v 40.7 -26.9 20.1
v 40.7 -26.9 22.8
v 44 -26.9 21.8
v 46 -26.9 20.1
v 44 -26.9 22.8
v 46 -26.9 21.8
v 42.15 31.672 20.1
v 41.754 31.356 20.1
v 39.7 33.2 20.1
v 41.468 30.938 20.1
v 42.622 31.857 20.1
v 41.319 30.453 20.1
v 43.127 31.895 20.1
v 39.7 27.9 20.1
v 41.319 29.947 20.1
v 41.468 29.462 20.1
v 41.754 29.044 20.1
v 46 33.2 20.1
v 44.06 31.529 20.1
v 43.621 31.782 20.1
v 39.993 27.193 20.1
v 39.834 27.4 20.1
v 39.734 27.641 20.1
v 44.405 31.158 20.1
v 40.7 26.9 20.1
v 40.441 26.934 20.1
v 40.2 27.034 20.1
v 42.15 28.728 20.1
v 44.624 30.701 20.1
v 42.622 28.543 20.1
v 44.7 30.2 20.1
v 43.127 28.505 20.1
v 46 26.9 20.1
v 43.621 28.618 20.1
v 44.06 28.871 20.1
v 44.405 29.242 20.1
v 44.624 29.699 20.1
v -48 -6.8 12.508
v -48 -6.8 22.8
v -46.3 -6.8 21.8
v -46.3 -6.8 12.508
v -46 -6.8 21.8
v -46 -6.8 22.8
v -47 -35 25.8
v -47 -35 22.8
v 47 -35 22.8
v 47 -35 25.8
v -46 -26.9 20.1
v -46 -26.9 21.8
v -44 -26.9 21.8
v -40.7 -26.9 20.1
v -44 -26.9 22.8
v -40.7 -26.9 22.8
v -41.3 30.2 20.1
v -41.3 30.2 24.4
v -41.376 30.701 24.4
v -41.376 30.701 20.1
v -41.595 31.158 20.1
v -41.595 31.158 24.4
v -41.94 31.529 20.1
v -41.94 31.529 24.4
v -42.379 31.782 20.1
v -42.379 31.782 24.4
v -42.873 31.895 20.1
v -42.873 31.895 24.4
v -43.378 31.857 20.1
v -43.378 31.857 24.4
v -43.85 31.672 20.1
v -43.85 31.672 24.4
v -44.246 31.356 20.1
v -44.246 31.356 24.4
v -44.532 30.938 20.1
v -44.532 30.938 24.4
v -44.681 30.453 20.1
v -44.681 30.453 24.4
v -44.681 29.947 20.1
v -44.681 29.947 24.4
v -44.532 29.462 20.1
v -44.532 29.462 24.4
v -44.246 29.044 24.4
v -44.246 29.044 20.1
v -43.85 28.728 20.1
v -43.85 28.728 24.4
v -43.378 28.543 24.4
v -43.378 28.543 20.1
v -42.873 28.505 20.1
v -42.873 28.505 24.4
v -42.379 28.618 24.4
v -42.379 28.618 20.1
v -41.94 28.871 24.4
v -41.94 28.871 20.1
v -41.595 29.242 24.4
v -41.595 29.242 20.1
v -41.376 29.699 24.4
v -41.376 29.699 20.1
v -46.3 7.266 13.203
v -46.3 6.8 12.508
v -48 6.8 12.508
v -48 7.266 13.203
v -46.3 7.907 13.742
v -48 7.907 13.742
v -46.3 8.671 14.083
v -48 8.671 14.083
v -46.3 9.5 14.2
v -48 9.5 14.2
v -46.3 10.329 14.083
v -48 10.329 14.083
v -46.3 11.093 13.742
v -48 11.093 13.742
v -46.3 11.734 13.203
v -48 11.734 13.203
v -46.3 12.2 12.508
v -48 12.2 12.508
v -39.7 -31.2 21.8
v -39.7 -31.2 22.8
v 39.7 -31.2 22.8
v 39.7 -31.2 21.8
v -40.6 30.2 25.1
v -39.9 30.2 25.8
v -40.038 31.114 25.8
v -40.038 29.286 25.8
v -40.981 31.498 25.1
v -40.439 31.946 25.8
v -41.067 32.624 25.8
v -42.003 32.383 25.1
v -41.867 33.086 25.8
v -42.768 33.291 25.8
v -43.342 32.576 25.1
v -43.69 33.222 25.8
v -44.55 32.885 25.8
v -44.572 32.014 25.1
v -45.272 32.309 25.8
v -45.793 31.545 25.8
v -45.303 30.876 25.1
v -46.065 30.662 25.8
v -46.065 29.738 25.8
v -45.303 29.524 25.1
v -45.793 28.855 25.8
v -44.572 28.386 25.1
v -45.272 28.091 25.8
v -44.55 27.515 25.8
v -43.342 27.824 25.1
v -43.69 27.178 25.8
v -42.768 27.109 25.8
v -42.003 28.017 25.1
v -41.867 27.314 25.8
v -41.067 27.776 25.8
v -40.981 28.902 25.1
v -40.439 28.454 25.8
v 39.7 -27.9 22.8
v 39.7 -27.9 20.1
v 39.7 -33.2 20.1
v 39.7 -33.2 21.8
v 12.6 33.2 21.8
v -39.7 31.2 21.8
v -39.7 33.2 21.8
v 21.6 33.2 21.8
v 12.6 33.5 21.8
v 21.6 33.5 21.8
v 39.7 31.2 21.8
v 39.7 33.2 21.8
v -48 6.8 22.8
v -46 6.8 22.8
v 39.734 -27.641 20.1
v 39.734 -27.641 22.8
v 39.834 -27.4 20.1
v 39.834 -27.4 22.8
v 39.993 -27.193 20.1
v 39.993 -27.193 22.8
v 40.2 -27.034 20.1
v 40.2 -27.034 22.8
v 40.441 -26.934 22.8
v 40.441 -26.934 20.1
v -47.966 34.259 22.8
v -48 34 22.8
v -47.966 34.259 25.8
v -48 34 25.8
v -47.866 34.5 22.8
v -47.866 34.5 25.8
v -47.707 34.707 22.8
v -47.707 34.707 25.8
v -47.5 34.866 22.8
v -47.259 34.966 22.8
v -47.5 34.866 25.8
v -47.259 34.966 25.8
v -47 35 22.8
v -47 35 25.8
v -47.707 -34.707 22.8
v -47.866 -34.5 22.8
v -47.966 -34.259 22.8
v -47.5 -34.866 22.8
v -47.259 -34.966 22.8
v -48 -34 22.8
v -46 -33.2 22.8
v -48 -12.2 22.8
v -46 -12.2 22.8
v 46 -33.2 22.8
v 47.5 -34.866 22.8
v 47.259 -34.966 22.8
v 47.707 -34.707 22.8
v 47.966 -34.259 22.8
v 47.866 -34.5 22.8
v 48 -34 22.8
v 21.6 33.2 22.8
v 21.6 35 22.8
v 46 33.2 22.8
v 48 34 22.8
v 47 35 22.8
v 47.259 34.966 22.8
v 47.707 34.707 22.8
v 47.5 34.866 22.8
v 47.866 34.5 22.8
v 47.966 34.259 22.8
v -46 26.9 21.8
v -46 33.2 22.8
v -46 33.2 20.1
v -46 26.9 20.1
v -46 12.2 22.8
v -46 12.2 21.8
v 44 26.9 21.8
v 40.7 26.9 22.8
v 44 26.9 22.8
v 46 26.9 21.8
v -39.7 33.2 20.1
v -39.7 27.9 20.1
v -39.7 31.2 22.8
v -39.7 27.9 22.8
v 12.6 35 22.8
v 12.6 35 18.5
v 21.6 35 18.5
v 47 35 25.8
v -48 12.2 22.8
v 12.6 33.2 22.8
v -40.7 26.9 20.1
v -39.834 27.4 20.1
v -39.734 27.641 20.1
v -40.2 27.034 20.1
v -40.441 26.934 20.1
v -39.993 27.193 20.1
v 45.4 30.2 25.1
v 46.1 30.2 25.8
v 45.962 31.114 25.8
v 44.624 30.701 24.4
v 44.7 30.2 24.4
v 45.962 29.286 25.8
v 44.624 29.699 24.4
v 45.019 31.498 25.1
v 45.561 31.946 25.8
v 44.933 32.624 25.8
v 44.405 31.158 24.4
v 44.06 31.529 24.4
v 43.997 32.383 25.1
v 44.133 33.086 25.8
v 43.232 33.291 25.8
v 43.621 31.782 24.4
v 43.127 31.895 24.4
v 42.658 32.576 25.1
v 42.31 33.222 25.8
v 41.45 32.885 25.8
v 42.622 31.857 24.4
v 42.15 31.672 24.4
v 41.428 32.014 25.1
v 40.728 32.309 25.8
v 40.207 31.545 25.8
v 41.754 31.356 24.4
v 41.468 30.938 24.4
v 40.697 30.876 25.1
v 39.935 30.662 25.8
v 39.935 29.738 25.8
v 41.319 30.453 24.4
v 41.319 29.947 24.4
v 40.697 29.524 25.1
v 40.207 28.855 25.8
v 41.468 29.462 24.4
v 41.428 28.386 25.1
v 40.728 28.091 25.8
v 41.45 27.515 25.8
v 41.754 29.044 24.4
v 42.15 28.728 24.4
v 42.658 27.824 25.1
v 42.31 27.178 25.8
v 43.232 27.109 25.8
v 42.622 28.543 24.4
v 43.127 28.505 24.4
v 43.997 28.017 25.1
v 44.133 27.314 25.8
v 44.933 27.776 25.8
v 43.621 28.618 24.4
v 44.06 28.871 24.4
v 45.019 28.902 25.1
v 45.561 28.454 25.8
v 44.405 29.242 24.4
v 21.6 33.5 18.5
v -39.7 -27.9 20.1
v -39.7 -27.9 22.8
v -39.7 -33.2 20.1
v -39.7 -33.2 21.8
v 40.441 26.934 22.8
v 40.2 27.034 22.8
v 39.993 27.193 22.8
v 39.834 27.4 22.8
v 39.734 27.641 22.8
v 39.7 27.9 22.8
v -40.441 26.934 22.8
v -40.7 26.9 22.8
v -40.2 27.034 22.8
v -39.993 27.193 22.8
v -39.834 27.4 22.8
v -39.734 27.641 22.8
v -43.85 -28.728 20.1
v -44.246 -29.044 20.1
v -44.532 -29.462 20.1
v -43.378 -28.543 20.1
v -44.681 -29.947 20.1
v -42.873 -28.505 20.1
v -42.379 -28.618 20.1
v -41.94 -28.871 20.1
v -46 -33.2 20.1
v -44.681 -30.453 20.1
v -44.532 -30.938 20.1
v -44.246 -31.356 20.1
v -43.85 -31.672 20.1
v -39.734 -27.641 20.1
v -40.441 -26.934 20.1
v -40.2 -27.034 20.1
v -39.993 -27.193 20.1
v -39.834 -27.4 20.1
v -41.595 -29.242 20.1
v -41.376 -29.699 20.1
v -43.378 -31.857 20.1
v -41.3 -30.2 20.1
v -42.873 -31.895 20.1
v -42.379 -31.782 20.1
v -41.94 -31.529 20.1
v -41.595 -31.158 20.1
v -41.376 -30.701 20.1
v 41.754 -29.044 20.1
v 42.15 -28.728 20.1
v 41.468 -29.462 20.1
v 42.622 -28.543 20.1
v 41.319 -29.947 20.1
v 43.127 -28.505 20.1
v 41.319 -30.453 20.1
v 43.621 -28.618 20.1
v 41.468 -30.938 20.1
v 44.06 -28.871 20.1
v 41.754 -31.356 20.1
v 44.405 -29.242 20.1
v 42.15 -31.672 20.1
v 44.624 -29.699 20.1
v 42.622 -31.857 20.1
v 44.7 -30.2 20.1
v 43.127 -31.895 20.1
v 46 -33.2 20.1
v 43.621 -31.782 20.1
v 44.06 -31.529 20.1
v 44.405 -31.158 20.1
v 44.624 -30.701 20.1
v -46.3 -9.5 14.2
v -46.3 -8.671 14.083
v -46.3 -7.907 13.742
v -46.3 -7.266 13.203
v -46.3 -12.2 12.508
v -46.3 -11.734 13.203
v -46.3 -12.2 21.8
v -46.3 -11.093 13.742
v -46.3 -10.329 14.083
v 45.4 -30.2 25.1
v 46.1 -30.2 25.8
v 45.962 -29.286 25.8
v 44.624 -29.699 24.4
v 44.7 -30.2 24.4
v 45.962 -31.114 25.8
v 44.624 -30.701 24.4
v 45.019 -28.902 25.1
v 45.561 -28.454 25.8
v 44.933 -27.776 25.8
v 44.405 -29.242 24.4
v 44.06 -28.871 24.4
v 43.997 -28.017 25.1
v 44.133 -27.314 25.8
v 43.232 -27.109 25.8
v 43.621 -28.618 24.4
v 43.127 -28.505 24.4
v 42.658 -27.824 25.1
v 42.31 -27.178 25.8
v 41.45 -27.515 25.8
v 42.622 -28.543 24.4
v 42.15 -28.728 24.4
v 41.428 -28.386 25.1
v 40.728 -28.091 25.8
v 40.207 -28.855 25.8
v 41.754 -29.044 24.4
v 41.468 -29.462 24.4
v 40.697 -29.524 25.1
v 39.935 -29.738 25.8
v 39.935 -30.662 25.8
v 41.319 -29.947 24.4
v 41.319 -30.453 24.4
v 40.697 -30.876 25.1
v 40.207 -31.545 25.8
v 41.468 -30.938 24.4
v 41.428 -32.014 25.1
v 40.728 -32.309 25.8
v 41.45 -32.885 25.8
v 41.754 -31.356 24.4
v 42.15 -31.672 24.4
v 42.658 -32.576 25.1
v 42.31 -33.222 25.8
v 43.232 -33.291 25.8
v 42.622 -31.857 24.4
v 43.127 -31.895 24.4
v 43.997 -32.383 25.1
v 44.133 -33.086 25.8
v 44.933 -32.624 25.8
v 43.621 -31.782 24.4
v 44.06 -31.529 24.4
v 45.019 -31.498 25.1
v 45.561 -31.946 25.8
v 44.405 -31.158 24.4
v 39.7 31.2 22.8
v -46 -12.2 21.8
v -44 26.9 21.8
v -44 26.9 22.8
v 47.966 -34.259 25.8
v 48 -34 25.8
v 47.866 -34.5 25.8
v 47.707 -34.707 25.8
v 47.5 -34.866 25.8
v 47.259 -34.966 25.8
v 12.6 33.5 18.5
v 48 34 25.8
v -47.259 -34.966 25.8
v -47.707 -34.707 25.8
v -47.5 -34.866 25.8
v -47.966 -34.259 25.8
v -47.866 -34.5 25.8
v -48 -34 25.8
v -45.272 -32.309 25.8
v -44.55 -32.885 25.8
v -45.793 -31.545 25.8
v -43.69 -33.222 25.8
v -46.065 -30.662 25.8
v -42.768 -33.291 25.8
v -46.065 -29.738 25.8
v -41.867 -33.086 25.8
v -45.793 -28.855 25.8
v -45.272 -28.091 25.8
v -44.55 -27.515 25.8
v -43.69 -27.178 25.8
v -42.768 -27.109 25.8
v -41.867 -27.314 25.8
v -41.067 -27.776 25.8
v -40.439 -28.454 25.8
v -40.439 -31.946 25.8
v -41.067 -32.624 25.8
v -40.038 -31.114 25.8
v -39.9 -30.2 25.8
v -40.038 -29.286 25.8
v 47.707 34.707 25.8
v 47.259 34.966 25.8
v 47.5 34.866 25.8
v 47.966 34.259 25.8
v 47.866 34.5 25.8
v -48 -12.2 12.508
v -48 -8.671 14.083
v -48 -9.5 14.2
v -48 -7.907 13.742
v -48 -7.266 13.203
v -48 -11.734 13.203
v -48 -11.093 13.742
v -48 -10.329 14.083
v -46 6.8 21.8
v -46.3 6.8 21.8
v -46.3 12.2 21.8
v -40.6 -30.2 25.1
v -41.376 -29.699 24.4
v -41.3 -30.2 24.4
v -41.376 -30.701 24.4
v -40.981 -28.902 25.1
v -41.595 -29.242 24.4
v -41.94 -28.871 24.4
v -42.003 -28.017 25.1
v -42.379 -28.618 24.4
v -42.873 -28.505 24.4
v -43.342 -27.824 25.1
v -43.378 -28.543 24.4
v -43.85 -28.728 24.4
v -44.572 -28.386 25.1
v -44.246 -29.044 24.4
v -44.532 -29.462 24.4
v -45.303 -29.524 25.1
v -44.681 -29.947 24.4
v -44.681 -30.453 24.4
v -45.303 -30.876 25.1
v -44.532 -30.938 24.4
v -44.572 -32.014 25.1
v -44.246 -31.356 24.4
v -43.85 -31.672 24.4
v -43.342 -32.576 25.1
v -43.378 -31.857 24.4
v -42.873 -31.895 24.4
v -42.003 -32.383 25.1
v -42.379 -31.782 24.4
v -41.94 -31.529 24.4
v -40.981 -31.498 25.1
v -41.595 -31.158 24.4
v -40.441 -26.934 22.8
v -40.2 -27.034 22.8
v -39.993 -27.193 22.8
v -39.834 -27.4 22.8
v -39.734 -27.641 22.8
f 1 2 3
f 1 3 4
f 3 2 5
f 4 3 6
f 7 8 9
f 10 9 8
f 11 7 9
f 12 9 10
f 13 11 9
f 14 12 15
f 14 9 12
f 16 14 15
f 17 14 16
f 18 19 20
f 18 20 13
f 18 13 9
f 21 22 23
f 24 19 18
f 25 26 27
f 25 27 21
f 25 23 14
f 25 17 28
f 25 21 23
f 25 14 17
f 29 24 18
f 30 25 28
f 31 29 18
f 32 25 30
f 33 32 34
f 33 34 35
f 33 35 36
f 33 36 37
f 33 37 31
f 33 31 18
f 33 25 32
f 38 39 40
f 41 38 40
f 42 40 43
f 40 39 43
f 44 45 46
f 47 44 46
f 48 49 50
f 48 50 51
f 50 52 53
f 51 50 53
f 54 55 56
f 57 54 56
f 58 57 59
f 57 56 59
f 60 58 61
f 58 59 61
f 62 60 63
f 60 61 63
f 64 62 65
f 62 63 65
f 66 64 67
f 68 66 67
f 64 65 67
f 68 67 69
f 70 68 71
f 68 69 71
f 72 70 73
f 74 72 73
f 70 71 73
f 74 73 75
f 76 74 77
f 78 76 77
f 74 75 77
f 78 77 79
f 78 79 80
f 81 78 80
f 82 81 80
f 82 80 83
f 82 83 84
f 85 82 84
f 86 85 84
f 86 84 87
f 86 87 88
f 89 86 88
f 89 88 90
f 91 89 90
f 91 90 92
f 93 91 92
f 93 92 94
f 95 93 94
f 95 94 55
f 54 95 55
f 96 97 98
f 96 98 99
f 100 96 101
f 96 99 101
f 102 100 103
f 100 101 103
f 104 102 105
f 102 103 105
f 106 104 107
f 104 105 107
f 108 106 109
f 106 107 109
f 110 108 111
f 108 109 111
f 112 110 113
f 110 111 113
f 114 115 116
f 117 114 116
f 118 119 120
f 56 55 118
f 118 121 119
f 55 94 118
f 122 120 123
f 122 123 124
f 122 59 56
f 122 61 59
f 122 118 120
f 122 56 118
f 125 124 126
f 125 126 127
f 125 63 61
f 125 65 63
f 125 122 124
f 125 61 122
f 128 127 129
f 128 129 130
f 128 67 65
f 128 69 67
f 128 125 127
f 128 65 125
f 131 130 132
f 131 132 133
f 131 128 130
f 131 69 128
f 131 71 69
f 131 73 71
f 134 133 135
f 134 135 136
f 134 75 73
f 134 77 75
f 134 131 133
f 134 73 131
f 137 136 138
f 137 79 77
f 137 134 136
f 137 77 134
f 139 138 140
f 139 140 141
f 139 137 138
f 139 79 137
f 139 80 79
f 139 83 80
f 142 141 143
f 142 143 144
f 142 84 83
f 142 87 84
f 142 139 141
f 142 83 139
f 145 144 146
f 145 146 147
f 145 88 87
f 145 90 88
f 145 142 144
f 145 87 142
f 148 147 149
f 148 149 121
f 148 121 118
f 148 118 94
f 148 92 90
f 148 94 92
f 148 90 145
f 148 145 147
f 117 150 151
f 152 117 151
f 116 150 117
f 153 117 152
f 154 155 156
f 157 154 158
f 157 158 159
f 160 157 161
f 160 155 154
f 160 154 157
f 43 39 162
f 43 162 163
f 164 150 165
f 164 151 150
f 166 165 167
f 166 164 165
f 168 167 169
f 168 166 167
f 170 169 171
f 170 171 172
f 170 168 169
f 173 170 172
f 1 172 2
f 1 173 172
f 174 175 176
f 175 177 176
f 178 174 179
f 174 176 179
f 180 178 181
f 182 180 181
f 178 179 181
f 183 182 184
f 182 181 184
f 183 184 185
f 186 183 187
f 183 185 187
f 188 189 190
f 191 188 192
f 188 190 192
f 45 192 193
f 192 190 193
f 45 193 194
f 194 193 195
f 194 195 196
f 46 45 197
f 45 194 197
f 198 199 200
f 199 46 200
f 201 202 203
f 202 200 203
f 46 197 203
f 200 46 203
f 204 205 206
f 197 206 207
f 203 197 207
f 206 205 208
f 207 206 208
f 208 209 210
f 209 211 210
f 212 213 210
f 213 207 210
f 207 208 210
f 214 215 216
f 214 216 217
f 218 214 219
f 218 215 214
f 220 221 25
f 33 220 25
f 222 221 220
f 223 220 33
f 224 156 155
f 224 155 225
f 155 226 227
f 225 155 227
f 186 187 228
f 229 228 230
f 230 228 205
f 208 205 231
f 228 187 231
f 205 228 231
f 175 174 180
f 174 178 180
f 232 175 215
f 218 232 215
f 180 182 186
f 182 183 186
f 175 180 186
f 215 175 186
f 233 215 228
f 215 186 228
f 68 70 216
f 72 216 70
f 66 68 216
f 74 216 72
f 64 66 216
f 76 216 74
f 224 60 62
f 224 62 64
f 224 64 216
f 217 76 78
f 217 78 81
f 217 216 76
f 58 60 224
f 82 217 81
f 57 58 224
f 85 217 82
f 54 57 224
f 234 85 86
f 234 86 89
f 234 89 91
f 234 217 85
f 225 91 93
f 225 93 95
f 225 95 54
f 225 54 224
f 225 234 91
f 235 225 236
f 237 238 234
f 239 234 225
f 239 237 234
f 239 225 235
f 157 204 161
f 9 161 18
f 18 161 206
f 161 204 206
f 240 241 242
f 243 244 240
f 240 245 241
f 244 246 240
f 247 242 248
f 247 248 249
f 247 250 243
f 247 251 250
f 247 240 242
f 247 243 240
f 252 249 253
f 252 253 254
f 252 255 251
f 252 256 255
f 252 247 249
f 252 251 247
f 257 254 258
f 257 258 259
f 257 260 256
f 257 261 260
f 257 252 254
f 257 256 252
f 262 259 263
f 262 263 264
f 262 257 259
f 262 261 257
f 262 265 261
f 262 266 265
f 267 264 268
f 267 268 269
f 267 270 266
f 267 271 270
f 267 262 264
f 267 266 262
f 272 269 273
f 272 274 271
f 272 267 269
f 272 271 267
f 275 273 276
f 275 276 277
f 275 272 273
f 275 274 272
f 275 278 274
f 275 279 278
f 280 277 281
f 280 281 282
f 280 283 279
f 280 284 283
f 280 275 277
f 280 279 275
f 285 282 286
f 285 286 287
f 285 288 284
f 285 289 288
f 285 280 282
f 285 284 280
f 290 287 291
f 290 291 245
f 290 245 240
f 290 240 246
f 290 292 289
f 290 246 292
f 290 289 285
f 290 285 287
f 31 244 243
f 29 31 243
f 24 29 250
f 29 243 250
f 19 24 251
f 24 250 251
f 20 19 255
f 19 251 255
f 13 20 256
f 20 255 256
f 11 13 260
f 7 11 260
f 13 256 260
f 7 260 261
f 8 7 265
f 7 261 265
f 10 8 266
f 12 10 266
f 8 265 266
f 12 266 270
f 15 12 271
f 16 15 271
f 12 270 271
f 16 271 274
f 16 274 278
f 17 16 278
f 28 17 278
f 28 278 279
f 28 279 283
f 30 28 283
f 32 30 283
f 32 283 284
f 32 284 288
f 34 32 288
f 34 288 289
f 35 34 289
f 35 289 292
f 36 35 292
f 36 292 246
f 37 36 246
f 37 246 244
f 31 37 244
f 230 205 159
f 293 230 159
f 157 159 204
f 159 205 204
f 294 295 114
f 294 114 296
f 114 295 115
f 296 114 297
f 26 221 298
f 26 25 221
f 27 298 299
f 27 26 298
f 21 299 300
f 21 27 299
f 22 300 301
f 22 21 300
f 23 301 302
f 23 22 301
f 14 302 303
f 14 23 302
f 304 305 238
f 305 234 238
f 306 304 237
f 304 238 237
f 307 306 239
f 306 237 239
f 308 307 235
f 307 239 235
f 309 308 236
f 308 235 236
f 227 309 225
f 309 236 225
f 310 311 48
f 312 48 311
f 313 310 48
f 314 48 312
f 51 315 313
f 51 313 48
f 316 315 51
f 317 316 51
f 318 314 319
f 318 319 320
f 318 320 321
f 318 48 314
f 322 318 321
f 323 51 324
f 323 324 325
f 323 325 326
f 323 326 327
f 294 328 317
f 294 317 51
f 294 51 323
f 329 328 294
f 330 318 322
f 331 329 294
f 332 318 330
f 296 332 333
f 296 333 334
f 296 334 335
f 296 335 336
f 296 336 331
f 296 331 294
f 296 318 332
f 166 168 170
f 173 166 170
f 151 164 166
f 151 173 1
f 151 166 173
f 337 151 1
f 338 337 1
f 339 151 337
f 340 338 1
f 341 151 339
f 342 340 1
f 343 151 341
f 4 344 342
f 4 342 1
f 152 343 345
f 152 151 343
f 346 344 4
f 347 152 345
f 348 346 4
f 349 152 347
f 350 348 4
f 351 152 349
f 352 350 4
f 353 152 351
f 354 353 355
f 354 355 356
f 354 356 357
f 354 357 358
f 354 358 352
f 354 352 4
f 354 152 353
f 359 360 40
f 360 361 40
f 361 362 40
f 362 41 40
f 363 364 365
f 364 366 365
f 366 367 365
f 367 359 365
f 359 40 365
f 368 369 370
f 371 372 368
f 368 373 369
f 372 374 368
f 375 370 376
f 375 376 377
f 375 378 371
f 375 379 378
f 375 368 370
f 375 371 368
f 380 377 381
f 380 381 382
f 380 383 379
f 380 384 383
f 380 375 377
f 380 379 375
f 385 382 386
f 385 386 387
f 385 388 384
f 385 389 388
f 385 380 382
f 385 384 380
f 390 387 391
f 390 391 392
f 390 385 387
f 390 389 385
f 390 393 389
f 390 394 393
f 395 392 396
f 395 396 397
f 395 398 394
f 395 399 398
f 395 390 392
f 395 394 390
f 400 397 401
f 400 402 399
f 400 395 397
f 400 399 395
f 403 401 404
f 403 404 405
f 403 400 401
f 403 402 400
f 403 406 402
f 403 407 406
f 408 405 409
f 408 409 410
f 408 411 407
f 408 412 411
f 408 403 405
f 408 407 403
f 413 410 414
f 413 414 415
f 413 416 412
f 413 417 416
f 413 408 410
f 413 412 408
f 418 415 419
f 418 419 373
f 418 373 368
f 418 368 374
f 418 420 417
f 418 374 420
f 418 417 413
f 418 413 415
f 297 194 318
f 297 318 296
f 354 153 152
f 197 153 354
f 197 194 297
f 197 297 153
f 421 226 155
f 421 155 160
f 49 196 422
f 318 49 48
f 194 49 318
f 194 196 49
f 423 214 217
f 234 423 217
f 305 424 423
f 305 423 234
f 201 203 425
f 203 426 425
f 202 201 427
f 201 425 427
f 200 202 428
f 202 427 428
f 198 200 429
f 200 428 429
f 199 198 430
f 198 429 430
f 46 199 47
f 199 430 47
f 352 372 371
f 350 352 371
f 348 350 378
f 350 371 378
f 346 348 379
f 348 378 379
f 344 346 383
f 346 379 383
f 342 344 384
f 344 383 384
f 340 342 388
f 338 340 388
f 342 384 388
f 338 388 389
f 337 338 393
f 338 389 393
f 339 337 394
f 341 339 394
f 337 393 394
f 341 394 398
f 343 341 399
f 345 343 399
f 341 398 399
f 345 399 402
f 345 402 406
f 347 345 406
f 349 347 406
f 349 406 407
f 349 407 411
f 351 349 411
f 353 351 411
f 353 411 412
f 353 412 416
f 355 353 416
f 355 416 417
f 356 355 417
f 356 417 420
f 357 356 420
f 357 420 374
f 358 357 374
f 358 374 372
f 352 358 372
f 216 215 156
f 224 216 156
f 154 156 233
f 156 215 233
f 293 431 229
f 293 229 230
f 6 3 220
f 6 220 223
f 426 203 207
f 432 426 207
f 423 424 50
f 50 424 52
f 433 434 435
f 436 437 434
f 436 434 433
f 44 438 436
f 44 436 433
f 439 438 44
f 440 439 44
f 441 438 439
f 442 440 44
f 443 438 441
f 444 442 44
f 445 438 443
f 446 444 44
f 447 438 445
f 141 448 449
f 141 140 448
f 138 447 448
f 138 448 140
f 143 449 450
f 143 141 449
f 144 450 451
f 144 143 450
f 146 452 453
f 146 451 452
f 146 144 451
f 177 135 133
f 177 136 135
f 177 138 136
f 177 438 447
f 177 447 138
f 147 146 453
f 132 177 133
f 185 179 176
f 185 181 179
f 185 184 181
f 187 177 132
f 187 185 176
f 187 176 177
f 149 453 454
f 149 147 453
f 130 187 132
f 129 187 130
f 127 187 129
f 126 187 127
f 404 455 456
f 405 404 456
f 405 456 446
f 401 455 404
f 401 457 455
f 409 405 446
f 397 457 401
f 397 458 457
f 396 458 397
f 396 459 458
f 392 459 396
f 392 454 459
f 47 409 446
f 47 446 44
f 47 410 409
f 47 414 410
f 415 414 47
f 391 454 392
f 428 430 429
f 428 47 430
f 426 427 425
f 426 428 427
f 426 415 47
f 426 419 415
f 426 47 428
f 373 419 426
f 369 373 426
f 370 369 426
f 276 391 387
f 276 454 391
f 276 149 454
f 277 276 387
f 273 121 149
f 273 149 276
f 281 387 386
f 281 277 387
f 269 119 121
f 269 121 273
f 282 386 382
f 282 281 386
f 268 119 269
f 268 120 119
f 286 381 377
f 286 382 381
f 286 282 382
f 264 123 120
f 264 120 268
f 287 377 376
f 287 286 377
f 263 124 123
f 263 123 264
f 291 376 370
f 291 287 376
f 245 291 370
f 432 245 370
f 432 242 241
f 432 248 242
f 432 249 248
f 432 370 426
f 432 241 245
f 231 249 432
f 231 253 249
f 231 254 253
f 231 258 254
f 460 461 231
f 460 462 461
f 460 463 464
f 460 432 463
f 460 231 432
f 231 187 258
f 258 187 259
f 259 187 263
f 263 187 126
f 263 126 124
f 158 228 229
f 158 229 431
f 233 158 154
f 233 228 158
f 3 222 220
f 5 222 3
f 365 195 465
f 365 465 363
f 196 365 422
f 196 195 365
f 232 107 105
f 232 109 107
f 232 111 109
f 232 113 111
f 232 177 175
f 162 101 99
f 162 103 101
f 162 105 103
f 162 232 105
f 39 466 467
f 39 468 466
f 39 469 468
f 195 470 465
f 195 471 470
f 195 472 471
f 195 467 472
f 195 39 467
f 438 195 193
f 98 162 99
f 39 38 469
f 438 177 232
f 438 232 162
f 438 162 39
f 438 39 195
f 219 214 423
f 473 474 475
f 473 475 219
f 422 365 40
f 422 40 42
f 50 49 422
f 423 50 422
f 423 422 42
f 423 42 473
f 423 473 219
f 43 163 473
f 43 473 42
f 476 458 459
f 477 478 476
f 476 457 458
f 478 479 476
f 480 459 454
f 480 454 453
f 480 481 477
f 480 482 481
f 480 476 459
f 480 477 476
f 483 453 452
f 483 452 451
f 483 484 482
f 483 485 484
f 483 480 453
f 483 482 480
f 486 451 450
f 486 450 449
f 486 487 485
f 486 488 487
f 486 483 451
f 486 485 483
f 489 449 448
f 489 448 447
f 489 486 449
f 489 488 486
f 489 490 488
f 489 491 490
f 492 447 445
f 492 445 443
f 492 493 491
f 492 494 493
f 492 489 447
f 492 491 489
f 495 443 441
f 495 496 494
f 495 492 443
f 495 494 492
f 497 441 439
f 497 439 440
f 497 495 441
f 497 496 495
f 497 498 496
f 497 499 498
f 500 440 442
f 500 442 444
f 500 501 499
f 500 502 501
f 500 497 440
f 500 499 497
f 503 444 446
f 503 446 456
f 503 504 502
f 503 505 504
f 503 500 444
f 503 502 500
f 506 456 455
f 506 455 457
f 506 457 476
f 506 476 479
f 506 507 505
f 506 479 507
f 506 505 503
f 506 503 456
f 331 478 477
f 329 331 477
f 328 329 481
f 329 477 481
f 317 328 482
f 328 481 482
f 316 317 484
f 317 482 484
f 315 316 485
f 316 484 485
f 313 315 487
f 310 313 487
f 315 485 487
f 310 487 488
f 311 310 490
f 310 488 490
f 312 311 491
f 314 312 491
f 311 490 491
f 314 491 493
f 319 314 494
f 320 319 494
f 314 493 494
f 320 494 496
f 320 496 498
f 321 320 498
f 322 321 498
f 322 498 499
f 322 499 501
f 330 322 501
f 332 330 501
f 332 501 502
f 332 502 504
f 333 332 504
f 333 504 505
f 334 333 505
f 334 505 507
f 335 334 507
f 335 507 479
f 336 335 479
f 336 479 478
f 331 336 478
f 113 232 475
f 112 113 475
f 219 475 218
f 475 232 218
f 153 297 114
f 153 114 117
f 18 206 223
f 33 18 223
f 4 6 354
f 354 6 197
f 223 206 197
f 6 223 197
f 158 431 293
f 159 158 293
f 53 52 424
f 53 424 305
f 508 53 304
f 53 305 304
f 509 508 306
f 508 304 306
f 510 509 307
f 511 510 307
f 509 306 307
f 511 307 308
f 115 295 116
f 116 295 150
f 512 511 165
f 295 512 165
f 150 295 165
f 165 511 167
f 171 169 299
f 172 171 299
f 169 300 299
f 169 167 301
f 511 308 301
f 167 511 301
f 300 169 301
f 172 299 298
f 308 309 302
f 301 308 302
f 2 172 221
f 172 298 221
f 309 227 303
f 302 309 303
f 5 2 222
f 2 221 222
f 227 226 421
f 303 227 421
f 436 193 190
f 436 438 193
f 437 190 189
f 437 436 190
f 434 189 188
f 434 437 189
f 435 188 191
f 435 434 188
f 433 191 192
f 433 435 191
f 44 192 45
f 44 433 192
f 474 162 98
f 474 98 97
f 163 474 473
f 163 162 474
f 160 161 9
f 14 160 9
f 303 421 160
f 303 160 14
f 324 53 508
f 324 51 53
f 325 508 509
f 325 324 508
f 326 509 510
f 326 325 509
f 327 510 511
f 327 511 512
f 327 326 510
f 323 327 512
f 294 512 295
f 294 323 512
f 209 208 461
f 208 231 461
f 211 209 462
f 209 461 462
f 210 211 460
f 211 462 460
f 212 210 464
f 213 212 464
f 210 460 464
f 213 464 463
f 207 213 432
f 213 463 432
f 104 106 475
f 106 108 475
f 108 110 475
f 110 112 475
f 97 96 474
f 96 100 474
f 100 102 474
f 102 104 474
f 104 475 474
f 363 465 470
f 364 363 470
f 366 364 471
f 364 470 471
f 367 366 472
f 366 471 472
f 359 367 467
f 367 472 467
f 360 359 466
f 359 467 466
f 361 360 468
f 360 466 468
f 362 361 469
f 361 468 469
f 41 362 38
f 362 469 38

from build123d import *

# Parameters (mm, degrees)
SKETCH016_W     = 96
SKETCH016_H     = 70
PAD003_DEPTH    = 3
SKETCH017_W     = 6.3
SKETCH017_H     = 6.3
PAD004_DEPTH    = 2.7
SKETCH018_R     = 1.7
POCKET013_DEPTH = 5.701
SKETCH019_W     = 79.4
SKETCH019_H     = 2
SKETCH019_W_2   = 2
SKETCH019_H_2   = 53.8
PAD005_DEPTH    = 1
SKETCH020_W     = 9
SKETCH020_H     = 1.8
PAD006_DEPTH    = 4.3
SKETCH021_W     = 9
SKETCH021_H     = 0.3
POCKET014_DEPTH = 3.3
SKETCH022_W     = 2
SKETCH022_H     = 5.4
PAD007_DEPTH    = 1
SKETCH023_W     = 1.7
SKETCH023_H     = 5.4
PAD008_DEPTH    = 10.6
SKETCH024_R     = 3
POCKET015_DEPTH = 96.001
SKETCH025_W     = 1.7
SKETCH025_H     = 5.4
PAD009_DEPTH    = 10.6
SKETCH026_R     = 3
POCKET016_DEPTH = 96.001
FILLET004_R     = 1
FILLET005_R     = 1
CHAMFER001_SIZE = 1.4


with BuildPart() as part:
    # Sketch016 → Pad003 (new body)
    with BuildSketch(Plane.XY.offset(22.8)):
        Rectangle(SKETCH016_W, SKETCH016_H)
    extrude(amount=PAD003_DEPTH)

    # Sketch017 (on Face5 of Pad003) → Pad004 (join)
    with BuildSketch(Plane(origin=(0, 0, 22.8), x_dir=(1, 0, 0), z_dir=(0, 0, -1))):
        with Locations((-42.85, 30.05)):
            Rectangle(SKETCH017_W, SKETCH017_H)
        with Locations((42.85, 30.05)):
            Rectangle(SKETCH017_W, SKETCH017_H)
        with Locations((42.85, -30.05)):
            Rectangle(SKETCH017_W, SKETCH017_H)
        with Locations((-42.85, -30.05)):
            Rectangle(SKETCH017_W, SKETCH017_H)
    extrude(amount=PAD004_DEPTH)

    # Sketch018 (on Face5 of Pad004) → Pocket013 (cut, through all)
    with BuildSketch(Plane.XY.offset(25.8)):
        with Locations((-43, 30.2)):
            Circle(SKETCH018_R)
        with Locations((43, 30.2)):
            Circle(SKETCH018_R)
        with Locations((43, -30.2)):
            Circle(SKETCH018_R)
        with Locations((-43, -30.2)):
            Circle(SKETCH018_R)
    extrude(amount=-POCKET013_DEPTH, mode=Mode.SUBTRACT)

    # Sketch019 (on Face4 of Pocket013) → Pad005 (join)
    with BuildSketch(Plane(origin=(0, 0, 22.8), x_dir=(1, 0, 0), z_dir=(0, 0, -1))):
        with Locations((0, -32.2)):
            Rectangle(SKETCH019_W, SKETCH019_H)
        with Locations((-45, 0)):
            Rectangle(SKETCH019_W_2, SKETCH019_H_2)
        with Locations((0, 32.2)):
            Rectangle(SKETCH019_W, SKETCH019_H)
        with Locations((45, 0)):
            Rectangle(SKETCH019_W_2, SKETCH019_H_2)
    extrude(amount=PAD005_DEPTH)

    # Sketch020 (on Face4 of Pad005) → Pad006 (join)
    with BuildSketch(Plane(origin=(0, 0, 22.8), x_dir=(1, 0, 0), z_dir=(0, 0, -1))):
        with Locations((17.1, -34.1)):
            Rectangle(SKETCH020_W, SKETCH020_H)
    extrude(amount=PAD006_DEPTH)

    # Sketch021 (on Face23 of Pad006) → Pocket014 (cut)
    with BuildSketch(Plane(origin=(0, 0, 18.5), x_dir=(1, 0, 0), z_dir=(0, 0, -1))):
        with Locations((17.1, -33.35)):
            Rectangle(SKETCH021_W, SKETCH021_H)
    extrude(amount=-POCKET014_DEPTH, mode=Mode.SUBTRACT)

    # Sketch022 (on Face4 of Pocket014) → Pad007 (join)
    with BuildSketch(Plane(origin=(0, 0, 22.8), x_dir=(1, 0, 0), z_dir=(0, 0, -1))):
        with Locations((-47, 9.5)):
            Rectangle(SKETCH022_W, SKETCH022_H)
        with Locations((-47, -9.5)):
            Rectangle(SKETCH022_W, SKETCH022_H)
    extrude(amount=PAD007_DEPTH)

    # Sketch023 (on Face39 of Pad007) → Pad008 (join)
    with BuildSketch(Plane(origin=(0, 0, 21.8), x_dir=(1, 0, 0), z_dir=(0, 0, -1))):
        with Locations((-47.15, -9.5)):
            Rectangle(SKETCH023_W, SKETCH023_H)
    extrude(amount=PAD008_DEPTH)

    # Sketch024 (on Face39 of Pad008) → Pocket015 (cut, through all)
    with BuildSketch(Plane(origin=(-48, 0, 0), x_dir=(0, -1, 0), z_dir=(-1, 0, 0))):
        with Locations((-9.5, 11.2)):
            Circle(SKETCH024_R)
    extrude(amount=-POCKET015_DEPTH, mode=Mode.SUBTRACT)

    # Sketch025 (on Face36 of Pocket015) → Pad009 (join)
    with BuildSketch(Plane(origin=(0, 0, 21.8), x_dir=(1, 0, 0), z_dir=(0, 0, -1))):
        with Locations((-47.15, 9.5)):
            Rectangle(SKETCH025_W, SKETCH025_H)
    extrude(amount=PAD009_DEPTH)

    # Sketch026 (on Face36 of Pad009) → Pocket016 (cut, through all)
    with BuildSketch(Plane(origin=(-48, 0, 0), x_dir=(0, -1, 0), z_dir=(-1, 0, 0))):
        with Locations((9.5, 11.2)):
            Circle(SKETCH026_R)
    extrude(amount=-POCKET016_DEPTH, mode=Mode.SUBTRACT)

    # Fillet004
    fillet004_edges = [part.edges().sort_by_distance(p)[0] for p in [
        (-39.7, -26.9, 21.45),
        (39.7, -26.9, 21.45),
        (39.7, 26.9, 21.45),
        (-39.7, 26.9, 21.45),
    ]]
    fillet(fillet004_edges, radius=FILLET004_R)

    # Fillet005
    fillet005_edges = [part.edges().sort_by_distance(p)[0] for p in [
        (-48, 35, 24.3),
        (-48, -35, 24.3),
        (48, -35, 24.3),
        (48, 35, 24.3),
    ]]
    fillet(fillet005_edges, radius=FILLET005_R)

    # Chamfer001
    chamfer001_edges = [part.edges().sort_by_distance(p)[0] for p in [
        (41.3, -30.2, 25.8),
        (-44.7, -30.2, 25.8),
        (41.3, 30.2, 25.8),
        (-44.7, 30.2, 25.8),
    ]]
    chamfer(chamfer001_edges, length=CHAMFER001_SIZE)


solid = part.part
